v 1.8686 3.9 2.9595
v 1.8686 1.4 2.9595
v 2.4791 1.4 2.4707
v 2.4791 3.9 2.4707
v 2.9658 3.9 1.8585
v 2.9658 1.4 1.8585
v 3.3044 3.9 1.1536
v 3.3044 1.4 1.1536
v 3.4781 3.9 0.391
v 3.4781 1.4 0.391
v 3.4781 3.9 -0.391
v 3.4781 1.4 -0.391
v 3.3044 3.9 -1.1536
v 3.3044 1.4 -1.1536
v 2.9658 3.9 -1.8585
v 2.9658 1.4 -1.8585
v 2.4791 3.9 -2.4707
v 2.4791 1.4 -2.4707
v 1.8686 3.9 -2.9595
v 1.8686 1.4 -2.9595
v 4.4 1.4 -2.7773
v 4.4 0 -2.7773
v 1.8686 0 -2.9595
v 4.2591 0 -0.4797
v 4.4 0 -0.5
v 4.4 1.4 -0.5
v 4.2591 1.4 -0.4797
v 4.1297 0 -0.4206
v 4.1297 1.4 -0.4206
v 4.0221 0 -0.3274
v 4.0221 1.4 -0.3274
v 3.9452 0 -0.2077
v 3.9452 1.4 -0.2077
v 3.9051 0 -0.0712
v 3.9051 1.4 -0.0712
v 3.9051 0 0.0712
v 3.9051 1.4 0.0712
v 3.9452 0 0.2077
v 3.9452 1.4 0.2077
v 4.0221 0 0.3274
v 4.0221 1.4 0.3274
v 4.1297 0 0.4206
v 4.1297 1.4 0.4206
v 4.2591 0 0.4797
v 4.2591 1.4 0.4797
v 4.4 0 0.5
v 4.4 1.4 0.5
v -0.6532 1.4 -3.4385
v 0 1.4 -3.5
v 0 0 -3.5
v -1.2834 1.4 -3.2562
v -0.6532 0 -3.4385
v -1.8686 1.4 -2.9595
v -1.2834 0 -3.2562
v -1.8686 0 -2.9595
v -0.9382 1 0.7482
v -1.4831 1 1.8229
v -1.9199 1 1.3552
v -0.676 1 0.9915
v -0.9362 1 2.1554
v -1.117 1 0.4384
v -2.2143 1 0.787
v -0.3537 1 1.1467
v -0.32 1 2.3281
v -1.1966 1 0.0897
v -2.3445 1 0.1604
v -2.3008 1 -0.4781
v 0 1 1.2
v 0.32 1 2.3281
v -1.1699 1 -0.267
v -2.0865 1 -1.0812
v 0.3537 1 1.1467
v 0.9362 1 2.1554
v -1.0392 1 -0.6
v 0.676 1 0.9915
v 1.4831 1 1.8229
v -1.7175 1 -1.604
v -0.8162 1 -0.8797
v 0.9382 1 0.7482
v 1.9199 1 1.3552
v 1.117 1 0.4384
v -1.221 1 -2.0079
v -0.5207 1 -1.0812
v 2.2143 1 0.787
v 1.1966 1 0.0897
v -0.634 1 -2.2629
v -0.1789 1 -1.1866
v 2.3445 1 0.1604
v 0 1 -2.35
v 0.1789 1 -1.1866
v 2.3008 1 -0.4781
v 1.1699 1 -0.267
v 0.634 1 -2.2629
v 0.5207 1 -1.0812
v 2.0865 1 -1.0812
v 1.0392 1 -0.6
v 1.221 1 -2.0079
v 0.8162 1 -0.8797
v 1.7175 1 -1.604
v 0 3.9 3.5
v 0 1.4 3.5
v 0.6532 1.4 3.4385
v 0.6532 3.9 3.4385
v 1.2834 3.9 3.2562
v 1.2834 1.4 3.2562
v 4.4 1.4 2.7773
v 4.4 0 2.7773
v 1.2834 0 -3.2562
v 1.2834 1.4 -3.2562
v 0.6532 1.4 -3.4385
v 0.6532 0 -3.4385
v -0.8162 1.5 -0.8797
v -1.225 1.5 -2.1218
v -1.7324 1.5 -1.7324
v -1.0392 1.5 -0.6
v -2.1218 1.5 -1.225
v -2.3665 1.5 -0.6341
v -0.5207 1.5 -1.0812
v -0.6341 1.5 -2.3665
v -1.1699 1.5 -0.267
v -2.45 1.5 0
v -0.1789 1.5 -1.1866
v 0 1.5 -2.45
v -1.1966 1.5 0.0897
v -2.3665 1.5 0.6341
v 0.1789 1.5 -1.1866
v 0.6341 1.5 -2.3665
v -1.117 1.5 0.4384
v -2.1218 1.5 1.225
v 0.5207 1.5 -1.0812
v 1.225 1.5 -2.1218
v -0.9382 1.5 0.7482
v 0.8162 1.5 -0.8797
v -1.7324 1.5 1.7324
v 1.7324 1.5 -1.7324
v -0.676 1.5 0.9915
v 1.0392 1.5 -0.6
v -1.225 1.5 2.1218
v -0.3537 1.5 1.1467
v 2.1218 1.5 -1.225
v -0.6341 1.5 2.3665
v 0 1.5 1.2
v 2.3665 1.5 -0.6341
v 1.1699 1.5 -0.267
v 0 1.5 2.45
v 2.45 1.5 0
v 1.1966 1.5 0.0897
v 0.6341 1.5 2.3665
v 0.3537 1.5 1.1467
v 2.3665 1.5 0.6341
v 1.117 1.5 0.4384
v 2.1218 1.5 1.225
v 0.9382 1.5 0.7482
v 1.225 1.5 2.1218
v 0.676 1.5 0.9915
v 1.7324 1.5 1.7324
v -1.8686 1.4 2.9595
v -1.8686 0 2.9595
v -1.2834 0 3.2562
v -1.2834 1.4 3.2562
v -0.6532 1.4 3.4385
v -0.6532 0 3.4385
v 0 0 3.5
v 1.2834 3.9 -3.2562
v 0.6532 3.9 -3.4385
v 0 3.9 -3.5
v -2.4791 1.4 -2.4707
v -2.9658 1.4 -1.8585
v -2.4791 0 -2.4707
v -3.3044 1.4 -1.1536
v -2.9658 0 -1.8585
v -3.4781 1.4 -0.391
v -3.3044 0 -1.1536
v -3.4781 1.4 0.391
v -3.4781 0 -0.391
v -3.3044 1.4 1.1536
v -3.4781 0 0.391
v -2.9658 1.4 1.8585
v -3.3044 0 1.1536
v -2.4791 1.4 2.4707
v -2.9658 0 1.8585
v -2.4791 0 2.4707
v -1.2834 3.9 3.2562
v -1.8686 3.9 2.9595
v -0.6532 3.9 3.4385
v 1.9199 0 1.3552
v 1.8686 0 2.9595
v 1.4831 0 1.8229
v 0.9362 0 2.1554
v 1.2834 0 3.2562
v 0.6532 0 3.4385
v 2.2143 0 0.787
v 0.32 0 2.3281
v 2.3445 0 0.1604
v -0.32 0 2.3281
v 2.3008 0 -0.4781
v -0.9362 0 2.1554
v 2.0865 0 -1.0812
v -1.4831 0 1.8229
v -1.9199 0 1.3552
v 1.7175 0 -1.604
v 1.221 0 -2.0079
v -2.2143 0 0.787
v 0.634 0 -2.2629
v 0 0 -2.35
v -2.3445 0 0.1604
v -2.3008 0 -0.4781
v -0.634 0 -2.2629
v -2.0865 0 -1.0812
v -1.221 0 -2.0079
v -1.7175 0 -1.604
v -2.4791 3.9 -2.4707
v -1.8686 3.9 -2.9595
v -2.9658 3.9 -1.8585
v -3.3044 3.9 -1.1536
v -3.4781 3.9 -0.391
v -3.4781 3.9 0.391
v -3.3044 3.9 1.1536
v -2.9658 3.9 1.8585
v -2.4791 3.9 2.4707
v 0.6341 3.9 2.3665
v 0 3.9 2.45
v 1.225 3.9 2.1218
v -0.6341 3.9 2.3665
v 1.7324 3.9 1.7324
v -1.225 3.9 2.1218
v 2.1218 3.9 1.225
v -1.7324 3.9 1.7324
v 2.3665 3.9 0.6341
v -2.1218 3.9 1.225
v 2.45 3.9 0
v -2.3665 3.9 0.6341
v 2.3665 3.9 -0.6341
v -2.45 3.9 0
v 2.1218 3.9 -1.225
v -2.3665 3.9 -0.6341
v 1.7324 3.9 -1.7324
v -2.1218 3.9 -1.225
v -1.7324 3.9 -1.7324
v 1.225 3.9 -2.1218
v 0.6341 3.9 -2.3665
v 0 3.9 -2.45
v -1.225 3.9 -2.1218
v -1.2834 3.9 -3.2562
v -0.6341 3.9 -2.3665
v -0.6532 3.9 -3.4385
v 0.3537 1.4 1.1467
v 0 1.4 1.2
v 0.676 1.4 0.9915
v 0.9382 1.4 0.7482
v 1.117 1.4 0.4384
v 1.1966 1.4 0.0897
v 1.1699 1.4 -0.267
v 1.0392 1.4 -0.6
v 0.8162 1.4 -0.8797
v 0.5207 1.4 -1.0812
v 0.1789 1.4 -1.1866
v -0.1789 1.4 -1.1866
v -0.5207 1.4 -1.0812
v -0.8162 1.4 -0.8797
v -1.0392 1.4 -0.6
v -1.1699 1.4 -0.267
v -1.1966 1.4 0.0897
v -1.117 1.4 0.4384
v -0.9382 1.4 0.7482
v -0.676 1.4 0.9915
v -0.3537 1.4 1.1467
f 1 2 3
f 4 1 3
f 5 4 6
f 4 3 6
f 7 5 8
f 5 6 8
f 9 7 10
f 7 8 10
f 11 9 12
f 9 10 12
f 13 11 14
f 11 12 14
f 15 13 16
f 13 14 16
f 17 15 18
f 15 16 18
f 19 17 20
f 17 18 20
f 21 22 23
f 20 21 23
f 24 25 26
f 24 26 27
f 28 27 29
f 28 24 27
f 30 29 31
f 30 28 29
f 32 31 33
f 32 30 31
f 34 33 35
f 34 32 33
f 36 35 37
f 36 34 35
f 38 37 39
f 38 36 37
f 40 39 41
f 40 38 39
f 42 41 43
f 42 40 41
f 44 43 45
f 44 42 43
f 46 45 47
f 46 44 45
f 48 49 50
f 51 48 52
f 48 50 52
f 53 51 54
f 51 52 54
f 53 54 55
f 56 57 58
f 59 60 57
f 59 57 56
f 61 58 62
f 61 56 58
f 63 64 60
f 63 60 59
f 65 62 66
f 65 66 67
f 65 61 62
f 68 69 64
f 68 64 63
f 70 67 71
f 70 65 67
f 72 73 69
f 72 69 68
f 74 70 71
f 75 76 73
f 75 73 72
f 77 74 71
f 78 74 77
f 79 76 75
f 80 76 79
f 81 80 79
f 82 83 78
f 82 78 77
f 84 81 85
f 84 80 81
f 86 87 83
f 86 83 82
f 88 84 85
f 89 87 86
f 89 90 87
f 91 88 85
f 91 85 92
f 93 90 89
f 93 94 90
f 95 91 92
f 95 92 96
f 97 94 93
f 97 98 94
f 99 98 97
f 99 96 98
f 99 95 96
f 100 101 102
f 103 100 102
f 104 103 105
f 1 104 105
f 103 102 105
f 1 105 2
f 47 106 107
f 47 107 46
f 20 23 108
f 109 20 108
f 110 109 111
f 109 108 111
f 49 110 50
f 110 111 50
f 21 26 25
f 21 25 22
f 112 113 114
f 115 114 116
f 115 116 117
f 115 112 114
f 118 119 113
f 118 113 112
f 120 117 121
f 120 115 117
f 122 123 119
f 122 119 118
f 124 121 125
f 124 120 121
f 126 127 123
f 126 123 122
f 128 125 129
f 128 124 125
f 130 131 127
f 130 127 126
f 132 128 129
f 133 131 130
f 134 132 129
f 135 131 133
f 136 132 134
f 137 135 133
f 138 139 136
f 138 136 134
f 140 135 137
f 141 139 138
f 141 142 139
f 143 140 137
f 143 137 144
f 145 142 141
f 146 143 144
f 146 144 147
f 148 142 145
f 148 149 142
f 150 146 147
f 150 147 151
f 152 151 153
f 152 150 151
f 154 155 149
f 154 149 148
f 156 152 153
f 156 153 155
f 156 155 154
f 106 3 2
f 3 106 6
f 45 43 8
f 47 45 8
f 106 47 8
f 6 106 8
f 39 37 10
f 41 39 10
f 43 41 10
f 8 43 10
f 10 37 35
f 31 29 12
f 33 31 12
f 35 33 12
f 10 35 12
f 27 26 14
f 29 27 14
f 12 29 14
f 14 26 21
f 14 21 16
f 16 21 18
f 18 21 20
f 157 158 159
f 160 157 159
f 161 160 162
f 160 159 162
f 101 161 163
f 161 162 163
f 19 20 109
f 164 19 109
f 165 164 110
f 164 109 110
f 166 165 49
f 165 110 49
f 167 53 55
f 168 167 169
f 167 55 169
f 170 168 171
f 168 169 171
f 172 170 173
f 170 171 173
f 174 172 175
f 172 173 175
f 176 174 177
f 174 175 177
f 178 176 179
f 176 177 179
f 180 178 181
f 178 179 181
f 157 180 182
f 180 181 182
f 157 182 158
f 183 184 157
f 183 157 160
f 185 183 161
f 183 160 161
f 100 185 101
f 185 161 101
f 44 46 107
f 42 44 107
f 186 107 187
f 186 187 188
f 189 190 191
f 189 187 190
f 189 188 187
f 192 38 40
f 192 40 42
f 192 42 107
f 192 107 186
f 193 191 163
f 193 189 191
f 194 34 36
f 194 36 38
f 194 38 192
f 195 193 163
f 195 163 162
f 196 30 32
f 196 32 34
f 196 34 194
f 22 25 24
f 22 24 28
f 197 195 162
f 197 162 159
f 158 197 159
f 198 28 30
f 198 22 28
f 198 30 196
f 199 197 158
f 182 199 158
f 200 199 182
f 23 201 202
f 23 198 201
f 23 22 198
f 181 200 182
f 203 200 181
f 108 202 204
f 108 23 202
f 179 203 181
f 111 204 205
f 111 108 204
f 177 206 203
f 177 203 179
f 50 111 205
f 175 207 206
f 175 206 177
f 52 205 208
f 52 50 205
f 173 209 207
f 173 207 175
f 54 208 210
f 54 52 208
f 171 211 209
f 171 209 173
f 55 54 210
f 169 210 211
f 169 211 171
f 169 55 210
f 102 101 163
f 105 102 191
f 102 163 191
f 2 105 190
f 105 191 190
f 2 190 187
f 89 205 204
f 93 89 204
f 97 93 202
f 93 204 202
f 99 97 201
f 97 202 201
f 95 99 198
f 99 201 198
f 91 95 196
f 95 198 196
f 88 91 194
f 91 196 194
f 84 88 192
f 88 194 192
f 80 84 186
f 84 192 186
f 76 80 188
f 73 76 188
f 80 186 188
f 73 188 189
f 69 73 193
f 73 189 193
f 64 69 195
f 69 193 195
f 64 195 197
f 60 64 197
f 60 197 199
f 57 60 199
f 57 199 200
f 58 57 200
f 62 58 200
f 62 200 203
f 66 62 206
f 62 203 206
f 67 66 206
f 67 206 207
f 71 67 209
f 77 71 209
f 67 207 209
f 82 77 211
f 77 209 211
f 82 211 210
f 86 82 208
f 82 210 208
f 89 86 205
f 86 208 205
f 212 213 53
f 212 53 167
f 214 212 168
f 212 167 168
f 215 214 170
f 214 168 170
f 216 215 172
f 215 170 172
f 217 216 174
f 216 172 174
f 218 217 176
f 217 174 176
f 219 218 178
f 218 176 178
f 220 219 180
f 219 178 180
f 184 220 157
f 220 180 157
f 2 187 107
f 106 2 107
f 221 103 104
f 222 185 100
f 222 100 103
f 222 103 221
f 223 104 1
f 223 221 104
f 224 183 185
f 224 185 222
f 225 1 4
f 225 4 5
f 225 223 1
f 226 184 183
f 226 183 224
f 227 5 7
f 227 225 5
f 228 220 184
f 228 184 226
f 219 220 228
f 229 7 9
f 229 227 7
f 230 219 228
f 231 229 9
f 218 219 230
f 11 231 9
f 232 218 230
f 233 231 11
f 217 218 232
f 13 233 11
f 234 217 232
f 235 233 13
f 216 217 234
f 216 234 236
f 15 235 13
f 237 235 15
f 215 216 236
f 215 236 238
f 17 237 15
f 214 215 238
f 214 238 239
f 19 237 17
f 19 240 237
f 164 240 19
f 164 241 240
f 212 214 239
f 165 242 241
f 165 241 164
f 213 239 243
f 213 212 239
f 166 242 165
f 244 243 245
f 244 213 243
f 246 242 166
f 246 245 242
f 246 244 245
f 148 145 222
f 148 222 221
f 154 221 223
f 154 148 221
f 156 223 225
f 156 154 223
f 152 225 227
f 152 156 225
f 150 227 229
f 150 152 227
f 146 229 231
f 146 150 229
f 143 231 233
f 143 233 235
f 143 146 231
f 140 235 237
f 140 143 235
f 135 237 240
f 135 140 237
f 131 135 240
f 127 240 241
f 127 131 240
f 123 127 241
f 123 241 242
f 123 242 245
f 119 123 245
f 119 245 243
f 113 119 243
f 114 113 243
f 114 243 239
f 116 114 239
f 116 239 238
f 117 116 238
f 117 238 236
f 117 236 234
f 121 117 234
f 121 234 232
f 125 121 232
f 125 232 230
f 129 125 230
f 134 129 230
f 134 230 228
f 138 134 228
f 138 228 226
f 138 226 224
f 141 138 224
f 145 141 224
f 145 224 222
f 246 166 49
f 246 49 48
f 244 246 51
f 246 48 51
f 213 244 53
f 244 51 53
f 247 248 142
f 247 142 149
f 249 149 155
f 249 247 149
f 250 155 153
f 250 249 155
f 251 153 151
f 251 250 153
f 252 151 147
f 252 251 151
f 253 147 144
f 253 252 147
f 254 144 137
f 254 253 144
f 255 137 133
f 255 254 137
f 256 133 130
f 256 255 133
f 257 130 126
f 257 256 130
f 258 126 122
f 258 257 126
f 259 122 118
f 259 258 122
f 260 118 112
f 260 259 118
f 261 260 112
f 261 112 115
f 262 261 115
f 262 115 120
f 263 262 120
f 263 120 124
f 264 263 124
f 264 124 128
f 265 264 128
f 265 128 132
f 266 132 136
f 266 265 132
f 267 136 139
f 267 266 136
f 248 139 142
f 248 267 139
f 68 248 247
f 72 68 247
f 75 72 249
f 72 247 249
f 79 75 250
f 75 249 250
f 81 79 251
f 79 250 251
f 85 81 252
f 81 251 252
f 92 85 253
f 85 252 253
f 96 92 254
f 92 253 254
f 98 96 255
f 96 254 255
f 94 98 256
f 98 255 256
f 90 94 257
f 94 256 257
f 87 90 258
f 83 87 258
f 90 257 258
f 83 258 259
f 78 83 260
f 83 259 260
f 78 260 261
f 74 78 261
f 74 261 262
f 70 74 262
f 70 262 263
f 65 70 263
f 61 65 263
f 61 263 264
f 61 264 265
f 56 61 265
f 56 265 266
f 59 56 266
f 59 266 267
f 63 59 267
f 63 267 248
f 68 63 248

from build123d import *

# Parameters (mm, degrees)
SKETCH1_R               = 0.5
BOSS_EXTRUDE1_DEPTH     = 1.4
SKETCH2_R               = 2.35
CUT_EXTRUDE1_DEPTH      = 1
SKETCH3_R               = 3.5
SKETCH3_R_2             = 2.45
BOSS_EXTRUDE2_DEPTH     = 2.5
SKETCH4_R               = 1.2
CUT_EXTRUDE2_DEPTH      = 20.282440198
SKETCH5_R               = 2.45
SKETCH5_R_2             = 1.2
BOSS_EXTRUDE3_DEPTH     = 0.1
SKETCH6_W               = 35.735260114
SKETCH6_H               = 17.672039004
CUT_EXTRUDE4_DEPTH      = 20.513392837
CUT_EXTRUDE5_DEPTH      = 18.980545042
CUT_EXTRUDE_START       = -1.4
CUT_EXTRUDE_1_OUTLINE_R = 0.5
CUT_EXTRUDE_1_DEPTH     = 1.4


# Read off the part's stored shape, not the designer's step: 切除-拉伸-薄壁1
with BuildPart() as part:
    # Sketch1 → Boss-Extrude1 (new body)
    with BuildSketch(Plane(origin=(0, 0, 0), x_dir=(1, 0, 0), z_dir=(0, 1, 0))):
        with BuildLine():
            Line((-15.2, 2), (-2, 2.95))
            Line((-2, 2.95), (-2, 6.35))
            ThreePointArc((-2, 6.35), (0, 8.35), (2, 6.35))
            Line((2, 6.35), (2, 3.5))
            Line((2, 3.5), (15.2, 2))
            ThreePointArc((15.2, 2), (17.2, 0), (15.2, -2))
            Line((15.2, -2), (2, -3.5))
            Line((2, -3.5), (2, -6.35))
            ThreePointArc((2, -6.35), (0, -8.35), (-2, -6.35))
            Line((-2, -6.35), (-2, -2.95))
            Line((-2, -2.95), (-15.2, -2))
            ThreePointArc((-15.2, -2), (-17.2, 0), (-15.2, 2))
        make_face()
        with Locations((0, 6.35)):
            Circle(SKETCH1_R, mode=Mode.SUBTRACT)
        with Locations((0, 4.55)):
            Circle(SKETCH1_R, mode=Mode.SUBTRACT)
        with Locations((0, -4.55)):
            Circle(SKETCH1_R, mode=Mode.SUBTRACT)
        with Locations((0, -6.35)):
            Circle(SKETCH1_R, mode=Mode.SUBTRACT)
        with Locations((-15.2, 0)):
            Circle(SKETCH1_R, mode=Mode.SUBTRACT)
        with Locations(Location((15.2, 0, 0), (0, 0, 270))):
            Circle(SKETCH1_R, mode=Mode.SUBTRACT)
        with Locations((-13.4, 0)):
            Circle(SKETCH1_R, mode=Mode.SUBTRACT)
        with Locations((-11.6, 0)):
            Circle(SKETCH1_R, mode=Mode.SUBTRACT)
        with Locations((-9.8, 0)):
            Circle(SKETCH1_R, mode=Mode.SUBTRACT)
        with Locations((-8, 0)):
            Circle(SKETCH1_R, mode=Mode.SUBTRACT)
        with Locations((-6.2, 0)):
            Circle(SKETCH1_R, mode=Mode.SUBTRACT)
        with Locations((-4.4, 0)):
            Circle(SKETCH1_R, mode=Mode.SUBTRACT)
        with Locations(Location((13.4, 0, 0), (0, 0, 270))):
            Circle(SKETCH1_R, mode=Mode.SUBTRACT)
        with Locations(Location((11.6, 0, 0), (0, 0, 270))):
            Circle(SKETCH1_R, mode=Mode.SUBTRACT)
        with Locations(Location((9.8, 0, 0), (0, 0, 270))):
            Circle(SKETCH1_R, mode=Mode.SUBTRACT)
        with Locations(Location((8, 0, 0), (0, 0, 270))):
            Circle(SKETCH1_R, mode=Mode.SUBTRACT)
        with Locations(Location((6.2, 0, 0), (0, 0, 270))):
            Circle(SKETCH1_R, mode=Mode.SUBTRACT)
        with Locations(Location((4.4, 0, 0), (0, 0, 270))):
            Circle(SKETCH1_R, mode=Mode.SUBTRACT)
    extrude(amount=BOSS_EXTRUDE1_DEPTH)

    # Sketch2 → Cut-Extrude1 (cut)
    with BuildSketch(Plane.XZ):
        with Locations(Location((0, 0, 0), (0, 0, 270))):
            Circle(SKETCH2_R)
    extrude(amount=-CUT_EXTRUDE1_DEPTH, mode=Mode.SUBTRACT)

    # Sketch3 → Boss-Extrude2 (add)
    with BuildSketch(Plane(origin=(0, 1.4, 0), x_dir=(1, 0, 0), z_dir=(0, 1, 0))):
        with Locations(Location((0, 0, 0), (0, 0, 57.731921145))):
            Circle(SKETCH3_R)
        with Locations(Location((0, 0, 0), (0, 0, 270))):
            Circle(SKETCH3_R_2, mode=Mode.SUBTRACT)
    extrude(amount=BOSS_EXTRUDE2_DEPTH)

    # Sketch4 → Cut-Extrude2 (cut, through all)
    with BuildSketch(Plane(origin=(0, 1.4, 0), x_dir=(1, 0, 0), z_dir=(0, 1, 0))):
        with Locations(Location((0, 0, 0), (0, 0, 270))):
            Circle(SKETCH4_R)
    extrude(amount=-CUT_EXTRUDE2_DEPTH, mode=Mode.SUBTRACT)

    # Sketch5 → Boss-Extrude3 (add)
    with BuildSketch(Plane(origin=(0, 1.4, 0), x_dir=(1, 0, 0), z_dir=(0, 1, 0))):
        with Locations(Location((0, 0, 0), (0, 0, 270))):
            Circle(SKETCH5_R)
        with Locations(Location((0, 0, 0), (0, 0, 270))):
            Circle(SKETCH5_R_2, mode=Mode.SUBTRACT)
    extrude(amount=BOSS_EXTRUDE3_DEPTH)

    # Sketch6 → Cut-Extrude4 (cut, through all)
    with BuildSketch(Plane.XZ):
        Rectangle(SKETCH6_W, SKETCH6_H)
        with BuildLine():
            Line((-1.868584713, -2.959457918), (-15.2, -2))
            ThreePointArc((-15.2, -2), (-17.2, 0), (-15.2, 2))
            Line((-15.2, 2), (-1.868584713, 2.959457918))
            ThreePointArc((-1.868584713, 2.959457918), (0, 3.5), (1.868584713, 2.959457918))
            Line((1.868584713, 2.959457918), (15.2, 2))
            ThreePointArc((15.2, 2), (17.2, 0), (15.2, -2))
            Line((15.2, -2), (1.868584713, -2.959457918))
            ThreePointArc((1.868584713, -2.959457918), (0, -3.5), (-1.868584713, -2.959457918))
        make_face(mode=Mode.SUBTRACT)
    extrude(amount=-CUT_EXTRUDE4_DEPTH, mode=Mode.SUBTRACT)

    # Sketch7 → Cut-Extrude5 (cut, through all)
    with BuildSketch(Plane.XZ):
        with BuildLine():
            Line((0, 3.5), (-17.731768104, 3.5))
            Line((-17.731768104, 3.5), (-17.731768104, -3.5))
            Line((-17.731768104, -3.5), (0, -3.5))
            ThreePointArc((0, -3.5), (-3.5, 0), (0, 3.5))
        make_face()
    extrude(amount=-CUT_EXTRUDE5_DEPTH, mode=Mode.SUBTRACT)

    # 切除-拉伸-薄壁1 outline → 切除-拉伸-薄壁1 (cut)
    with BuildSketch(Plane(origin=(0, 0, 0), x_dir=(-1, 0, 0), z_dir=(0, -1, 0)).offset(CUT_EXTRUDE_START)):
        with BuildLine():
            Line((-4.4, -2.777272727), (-4.4, -0.5))
            ThreePointArc((-4.4, -0.5), (-4.9, 0), (-4.4, 0.5))
            Line((-4.4, 0.5), (-4.4, 2.777272727))
            Line((-4.4, 2.777272727), (-15.2, 2))
            ThreePointArc((-15.2, 2), (-17.2, 0), (-15.2, -2))
            Line((-15.2, -2), (-4.4, -2.777272727))
        make_face()
        with Locations((-15.2, 0)):
            Circle(CUT_EXTRUDE_1_OUTLINE_R, mode=Mode.SUBTRACT)
        with Locations((-13.4, 0)):
            Circle(CUT_EXTRUDE_1_OUTLINE_R, mode=Mode.SUBTRACT)
        with Locations((-11.6, 0)):
            Circle(CUT_EXTRUDE_1_OUTLINE_R, mode=Mode.SUBTRACT)
        with Locations((-9.8, 0)):
            Circle(CUT_EXTRUDE_1_OUTLINE_R, mode=Mode.SUBTRACT)
        with Locations((-8, 0)):
            Circle(CUT_EXTRUDE_1_OUTLINE_R, mode=Mode.SUBTRACT)
        with Locations((-6.2, 0)):
            Circle(CUT_EXTRUDE_1_OUTLINE_R, mode=Mode.SUBTRACT)
    extrude(amount=CUT_EXTRUDE_1_DEPTH, mode=Mode.SUBTRACT)


solid = part.part
